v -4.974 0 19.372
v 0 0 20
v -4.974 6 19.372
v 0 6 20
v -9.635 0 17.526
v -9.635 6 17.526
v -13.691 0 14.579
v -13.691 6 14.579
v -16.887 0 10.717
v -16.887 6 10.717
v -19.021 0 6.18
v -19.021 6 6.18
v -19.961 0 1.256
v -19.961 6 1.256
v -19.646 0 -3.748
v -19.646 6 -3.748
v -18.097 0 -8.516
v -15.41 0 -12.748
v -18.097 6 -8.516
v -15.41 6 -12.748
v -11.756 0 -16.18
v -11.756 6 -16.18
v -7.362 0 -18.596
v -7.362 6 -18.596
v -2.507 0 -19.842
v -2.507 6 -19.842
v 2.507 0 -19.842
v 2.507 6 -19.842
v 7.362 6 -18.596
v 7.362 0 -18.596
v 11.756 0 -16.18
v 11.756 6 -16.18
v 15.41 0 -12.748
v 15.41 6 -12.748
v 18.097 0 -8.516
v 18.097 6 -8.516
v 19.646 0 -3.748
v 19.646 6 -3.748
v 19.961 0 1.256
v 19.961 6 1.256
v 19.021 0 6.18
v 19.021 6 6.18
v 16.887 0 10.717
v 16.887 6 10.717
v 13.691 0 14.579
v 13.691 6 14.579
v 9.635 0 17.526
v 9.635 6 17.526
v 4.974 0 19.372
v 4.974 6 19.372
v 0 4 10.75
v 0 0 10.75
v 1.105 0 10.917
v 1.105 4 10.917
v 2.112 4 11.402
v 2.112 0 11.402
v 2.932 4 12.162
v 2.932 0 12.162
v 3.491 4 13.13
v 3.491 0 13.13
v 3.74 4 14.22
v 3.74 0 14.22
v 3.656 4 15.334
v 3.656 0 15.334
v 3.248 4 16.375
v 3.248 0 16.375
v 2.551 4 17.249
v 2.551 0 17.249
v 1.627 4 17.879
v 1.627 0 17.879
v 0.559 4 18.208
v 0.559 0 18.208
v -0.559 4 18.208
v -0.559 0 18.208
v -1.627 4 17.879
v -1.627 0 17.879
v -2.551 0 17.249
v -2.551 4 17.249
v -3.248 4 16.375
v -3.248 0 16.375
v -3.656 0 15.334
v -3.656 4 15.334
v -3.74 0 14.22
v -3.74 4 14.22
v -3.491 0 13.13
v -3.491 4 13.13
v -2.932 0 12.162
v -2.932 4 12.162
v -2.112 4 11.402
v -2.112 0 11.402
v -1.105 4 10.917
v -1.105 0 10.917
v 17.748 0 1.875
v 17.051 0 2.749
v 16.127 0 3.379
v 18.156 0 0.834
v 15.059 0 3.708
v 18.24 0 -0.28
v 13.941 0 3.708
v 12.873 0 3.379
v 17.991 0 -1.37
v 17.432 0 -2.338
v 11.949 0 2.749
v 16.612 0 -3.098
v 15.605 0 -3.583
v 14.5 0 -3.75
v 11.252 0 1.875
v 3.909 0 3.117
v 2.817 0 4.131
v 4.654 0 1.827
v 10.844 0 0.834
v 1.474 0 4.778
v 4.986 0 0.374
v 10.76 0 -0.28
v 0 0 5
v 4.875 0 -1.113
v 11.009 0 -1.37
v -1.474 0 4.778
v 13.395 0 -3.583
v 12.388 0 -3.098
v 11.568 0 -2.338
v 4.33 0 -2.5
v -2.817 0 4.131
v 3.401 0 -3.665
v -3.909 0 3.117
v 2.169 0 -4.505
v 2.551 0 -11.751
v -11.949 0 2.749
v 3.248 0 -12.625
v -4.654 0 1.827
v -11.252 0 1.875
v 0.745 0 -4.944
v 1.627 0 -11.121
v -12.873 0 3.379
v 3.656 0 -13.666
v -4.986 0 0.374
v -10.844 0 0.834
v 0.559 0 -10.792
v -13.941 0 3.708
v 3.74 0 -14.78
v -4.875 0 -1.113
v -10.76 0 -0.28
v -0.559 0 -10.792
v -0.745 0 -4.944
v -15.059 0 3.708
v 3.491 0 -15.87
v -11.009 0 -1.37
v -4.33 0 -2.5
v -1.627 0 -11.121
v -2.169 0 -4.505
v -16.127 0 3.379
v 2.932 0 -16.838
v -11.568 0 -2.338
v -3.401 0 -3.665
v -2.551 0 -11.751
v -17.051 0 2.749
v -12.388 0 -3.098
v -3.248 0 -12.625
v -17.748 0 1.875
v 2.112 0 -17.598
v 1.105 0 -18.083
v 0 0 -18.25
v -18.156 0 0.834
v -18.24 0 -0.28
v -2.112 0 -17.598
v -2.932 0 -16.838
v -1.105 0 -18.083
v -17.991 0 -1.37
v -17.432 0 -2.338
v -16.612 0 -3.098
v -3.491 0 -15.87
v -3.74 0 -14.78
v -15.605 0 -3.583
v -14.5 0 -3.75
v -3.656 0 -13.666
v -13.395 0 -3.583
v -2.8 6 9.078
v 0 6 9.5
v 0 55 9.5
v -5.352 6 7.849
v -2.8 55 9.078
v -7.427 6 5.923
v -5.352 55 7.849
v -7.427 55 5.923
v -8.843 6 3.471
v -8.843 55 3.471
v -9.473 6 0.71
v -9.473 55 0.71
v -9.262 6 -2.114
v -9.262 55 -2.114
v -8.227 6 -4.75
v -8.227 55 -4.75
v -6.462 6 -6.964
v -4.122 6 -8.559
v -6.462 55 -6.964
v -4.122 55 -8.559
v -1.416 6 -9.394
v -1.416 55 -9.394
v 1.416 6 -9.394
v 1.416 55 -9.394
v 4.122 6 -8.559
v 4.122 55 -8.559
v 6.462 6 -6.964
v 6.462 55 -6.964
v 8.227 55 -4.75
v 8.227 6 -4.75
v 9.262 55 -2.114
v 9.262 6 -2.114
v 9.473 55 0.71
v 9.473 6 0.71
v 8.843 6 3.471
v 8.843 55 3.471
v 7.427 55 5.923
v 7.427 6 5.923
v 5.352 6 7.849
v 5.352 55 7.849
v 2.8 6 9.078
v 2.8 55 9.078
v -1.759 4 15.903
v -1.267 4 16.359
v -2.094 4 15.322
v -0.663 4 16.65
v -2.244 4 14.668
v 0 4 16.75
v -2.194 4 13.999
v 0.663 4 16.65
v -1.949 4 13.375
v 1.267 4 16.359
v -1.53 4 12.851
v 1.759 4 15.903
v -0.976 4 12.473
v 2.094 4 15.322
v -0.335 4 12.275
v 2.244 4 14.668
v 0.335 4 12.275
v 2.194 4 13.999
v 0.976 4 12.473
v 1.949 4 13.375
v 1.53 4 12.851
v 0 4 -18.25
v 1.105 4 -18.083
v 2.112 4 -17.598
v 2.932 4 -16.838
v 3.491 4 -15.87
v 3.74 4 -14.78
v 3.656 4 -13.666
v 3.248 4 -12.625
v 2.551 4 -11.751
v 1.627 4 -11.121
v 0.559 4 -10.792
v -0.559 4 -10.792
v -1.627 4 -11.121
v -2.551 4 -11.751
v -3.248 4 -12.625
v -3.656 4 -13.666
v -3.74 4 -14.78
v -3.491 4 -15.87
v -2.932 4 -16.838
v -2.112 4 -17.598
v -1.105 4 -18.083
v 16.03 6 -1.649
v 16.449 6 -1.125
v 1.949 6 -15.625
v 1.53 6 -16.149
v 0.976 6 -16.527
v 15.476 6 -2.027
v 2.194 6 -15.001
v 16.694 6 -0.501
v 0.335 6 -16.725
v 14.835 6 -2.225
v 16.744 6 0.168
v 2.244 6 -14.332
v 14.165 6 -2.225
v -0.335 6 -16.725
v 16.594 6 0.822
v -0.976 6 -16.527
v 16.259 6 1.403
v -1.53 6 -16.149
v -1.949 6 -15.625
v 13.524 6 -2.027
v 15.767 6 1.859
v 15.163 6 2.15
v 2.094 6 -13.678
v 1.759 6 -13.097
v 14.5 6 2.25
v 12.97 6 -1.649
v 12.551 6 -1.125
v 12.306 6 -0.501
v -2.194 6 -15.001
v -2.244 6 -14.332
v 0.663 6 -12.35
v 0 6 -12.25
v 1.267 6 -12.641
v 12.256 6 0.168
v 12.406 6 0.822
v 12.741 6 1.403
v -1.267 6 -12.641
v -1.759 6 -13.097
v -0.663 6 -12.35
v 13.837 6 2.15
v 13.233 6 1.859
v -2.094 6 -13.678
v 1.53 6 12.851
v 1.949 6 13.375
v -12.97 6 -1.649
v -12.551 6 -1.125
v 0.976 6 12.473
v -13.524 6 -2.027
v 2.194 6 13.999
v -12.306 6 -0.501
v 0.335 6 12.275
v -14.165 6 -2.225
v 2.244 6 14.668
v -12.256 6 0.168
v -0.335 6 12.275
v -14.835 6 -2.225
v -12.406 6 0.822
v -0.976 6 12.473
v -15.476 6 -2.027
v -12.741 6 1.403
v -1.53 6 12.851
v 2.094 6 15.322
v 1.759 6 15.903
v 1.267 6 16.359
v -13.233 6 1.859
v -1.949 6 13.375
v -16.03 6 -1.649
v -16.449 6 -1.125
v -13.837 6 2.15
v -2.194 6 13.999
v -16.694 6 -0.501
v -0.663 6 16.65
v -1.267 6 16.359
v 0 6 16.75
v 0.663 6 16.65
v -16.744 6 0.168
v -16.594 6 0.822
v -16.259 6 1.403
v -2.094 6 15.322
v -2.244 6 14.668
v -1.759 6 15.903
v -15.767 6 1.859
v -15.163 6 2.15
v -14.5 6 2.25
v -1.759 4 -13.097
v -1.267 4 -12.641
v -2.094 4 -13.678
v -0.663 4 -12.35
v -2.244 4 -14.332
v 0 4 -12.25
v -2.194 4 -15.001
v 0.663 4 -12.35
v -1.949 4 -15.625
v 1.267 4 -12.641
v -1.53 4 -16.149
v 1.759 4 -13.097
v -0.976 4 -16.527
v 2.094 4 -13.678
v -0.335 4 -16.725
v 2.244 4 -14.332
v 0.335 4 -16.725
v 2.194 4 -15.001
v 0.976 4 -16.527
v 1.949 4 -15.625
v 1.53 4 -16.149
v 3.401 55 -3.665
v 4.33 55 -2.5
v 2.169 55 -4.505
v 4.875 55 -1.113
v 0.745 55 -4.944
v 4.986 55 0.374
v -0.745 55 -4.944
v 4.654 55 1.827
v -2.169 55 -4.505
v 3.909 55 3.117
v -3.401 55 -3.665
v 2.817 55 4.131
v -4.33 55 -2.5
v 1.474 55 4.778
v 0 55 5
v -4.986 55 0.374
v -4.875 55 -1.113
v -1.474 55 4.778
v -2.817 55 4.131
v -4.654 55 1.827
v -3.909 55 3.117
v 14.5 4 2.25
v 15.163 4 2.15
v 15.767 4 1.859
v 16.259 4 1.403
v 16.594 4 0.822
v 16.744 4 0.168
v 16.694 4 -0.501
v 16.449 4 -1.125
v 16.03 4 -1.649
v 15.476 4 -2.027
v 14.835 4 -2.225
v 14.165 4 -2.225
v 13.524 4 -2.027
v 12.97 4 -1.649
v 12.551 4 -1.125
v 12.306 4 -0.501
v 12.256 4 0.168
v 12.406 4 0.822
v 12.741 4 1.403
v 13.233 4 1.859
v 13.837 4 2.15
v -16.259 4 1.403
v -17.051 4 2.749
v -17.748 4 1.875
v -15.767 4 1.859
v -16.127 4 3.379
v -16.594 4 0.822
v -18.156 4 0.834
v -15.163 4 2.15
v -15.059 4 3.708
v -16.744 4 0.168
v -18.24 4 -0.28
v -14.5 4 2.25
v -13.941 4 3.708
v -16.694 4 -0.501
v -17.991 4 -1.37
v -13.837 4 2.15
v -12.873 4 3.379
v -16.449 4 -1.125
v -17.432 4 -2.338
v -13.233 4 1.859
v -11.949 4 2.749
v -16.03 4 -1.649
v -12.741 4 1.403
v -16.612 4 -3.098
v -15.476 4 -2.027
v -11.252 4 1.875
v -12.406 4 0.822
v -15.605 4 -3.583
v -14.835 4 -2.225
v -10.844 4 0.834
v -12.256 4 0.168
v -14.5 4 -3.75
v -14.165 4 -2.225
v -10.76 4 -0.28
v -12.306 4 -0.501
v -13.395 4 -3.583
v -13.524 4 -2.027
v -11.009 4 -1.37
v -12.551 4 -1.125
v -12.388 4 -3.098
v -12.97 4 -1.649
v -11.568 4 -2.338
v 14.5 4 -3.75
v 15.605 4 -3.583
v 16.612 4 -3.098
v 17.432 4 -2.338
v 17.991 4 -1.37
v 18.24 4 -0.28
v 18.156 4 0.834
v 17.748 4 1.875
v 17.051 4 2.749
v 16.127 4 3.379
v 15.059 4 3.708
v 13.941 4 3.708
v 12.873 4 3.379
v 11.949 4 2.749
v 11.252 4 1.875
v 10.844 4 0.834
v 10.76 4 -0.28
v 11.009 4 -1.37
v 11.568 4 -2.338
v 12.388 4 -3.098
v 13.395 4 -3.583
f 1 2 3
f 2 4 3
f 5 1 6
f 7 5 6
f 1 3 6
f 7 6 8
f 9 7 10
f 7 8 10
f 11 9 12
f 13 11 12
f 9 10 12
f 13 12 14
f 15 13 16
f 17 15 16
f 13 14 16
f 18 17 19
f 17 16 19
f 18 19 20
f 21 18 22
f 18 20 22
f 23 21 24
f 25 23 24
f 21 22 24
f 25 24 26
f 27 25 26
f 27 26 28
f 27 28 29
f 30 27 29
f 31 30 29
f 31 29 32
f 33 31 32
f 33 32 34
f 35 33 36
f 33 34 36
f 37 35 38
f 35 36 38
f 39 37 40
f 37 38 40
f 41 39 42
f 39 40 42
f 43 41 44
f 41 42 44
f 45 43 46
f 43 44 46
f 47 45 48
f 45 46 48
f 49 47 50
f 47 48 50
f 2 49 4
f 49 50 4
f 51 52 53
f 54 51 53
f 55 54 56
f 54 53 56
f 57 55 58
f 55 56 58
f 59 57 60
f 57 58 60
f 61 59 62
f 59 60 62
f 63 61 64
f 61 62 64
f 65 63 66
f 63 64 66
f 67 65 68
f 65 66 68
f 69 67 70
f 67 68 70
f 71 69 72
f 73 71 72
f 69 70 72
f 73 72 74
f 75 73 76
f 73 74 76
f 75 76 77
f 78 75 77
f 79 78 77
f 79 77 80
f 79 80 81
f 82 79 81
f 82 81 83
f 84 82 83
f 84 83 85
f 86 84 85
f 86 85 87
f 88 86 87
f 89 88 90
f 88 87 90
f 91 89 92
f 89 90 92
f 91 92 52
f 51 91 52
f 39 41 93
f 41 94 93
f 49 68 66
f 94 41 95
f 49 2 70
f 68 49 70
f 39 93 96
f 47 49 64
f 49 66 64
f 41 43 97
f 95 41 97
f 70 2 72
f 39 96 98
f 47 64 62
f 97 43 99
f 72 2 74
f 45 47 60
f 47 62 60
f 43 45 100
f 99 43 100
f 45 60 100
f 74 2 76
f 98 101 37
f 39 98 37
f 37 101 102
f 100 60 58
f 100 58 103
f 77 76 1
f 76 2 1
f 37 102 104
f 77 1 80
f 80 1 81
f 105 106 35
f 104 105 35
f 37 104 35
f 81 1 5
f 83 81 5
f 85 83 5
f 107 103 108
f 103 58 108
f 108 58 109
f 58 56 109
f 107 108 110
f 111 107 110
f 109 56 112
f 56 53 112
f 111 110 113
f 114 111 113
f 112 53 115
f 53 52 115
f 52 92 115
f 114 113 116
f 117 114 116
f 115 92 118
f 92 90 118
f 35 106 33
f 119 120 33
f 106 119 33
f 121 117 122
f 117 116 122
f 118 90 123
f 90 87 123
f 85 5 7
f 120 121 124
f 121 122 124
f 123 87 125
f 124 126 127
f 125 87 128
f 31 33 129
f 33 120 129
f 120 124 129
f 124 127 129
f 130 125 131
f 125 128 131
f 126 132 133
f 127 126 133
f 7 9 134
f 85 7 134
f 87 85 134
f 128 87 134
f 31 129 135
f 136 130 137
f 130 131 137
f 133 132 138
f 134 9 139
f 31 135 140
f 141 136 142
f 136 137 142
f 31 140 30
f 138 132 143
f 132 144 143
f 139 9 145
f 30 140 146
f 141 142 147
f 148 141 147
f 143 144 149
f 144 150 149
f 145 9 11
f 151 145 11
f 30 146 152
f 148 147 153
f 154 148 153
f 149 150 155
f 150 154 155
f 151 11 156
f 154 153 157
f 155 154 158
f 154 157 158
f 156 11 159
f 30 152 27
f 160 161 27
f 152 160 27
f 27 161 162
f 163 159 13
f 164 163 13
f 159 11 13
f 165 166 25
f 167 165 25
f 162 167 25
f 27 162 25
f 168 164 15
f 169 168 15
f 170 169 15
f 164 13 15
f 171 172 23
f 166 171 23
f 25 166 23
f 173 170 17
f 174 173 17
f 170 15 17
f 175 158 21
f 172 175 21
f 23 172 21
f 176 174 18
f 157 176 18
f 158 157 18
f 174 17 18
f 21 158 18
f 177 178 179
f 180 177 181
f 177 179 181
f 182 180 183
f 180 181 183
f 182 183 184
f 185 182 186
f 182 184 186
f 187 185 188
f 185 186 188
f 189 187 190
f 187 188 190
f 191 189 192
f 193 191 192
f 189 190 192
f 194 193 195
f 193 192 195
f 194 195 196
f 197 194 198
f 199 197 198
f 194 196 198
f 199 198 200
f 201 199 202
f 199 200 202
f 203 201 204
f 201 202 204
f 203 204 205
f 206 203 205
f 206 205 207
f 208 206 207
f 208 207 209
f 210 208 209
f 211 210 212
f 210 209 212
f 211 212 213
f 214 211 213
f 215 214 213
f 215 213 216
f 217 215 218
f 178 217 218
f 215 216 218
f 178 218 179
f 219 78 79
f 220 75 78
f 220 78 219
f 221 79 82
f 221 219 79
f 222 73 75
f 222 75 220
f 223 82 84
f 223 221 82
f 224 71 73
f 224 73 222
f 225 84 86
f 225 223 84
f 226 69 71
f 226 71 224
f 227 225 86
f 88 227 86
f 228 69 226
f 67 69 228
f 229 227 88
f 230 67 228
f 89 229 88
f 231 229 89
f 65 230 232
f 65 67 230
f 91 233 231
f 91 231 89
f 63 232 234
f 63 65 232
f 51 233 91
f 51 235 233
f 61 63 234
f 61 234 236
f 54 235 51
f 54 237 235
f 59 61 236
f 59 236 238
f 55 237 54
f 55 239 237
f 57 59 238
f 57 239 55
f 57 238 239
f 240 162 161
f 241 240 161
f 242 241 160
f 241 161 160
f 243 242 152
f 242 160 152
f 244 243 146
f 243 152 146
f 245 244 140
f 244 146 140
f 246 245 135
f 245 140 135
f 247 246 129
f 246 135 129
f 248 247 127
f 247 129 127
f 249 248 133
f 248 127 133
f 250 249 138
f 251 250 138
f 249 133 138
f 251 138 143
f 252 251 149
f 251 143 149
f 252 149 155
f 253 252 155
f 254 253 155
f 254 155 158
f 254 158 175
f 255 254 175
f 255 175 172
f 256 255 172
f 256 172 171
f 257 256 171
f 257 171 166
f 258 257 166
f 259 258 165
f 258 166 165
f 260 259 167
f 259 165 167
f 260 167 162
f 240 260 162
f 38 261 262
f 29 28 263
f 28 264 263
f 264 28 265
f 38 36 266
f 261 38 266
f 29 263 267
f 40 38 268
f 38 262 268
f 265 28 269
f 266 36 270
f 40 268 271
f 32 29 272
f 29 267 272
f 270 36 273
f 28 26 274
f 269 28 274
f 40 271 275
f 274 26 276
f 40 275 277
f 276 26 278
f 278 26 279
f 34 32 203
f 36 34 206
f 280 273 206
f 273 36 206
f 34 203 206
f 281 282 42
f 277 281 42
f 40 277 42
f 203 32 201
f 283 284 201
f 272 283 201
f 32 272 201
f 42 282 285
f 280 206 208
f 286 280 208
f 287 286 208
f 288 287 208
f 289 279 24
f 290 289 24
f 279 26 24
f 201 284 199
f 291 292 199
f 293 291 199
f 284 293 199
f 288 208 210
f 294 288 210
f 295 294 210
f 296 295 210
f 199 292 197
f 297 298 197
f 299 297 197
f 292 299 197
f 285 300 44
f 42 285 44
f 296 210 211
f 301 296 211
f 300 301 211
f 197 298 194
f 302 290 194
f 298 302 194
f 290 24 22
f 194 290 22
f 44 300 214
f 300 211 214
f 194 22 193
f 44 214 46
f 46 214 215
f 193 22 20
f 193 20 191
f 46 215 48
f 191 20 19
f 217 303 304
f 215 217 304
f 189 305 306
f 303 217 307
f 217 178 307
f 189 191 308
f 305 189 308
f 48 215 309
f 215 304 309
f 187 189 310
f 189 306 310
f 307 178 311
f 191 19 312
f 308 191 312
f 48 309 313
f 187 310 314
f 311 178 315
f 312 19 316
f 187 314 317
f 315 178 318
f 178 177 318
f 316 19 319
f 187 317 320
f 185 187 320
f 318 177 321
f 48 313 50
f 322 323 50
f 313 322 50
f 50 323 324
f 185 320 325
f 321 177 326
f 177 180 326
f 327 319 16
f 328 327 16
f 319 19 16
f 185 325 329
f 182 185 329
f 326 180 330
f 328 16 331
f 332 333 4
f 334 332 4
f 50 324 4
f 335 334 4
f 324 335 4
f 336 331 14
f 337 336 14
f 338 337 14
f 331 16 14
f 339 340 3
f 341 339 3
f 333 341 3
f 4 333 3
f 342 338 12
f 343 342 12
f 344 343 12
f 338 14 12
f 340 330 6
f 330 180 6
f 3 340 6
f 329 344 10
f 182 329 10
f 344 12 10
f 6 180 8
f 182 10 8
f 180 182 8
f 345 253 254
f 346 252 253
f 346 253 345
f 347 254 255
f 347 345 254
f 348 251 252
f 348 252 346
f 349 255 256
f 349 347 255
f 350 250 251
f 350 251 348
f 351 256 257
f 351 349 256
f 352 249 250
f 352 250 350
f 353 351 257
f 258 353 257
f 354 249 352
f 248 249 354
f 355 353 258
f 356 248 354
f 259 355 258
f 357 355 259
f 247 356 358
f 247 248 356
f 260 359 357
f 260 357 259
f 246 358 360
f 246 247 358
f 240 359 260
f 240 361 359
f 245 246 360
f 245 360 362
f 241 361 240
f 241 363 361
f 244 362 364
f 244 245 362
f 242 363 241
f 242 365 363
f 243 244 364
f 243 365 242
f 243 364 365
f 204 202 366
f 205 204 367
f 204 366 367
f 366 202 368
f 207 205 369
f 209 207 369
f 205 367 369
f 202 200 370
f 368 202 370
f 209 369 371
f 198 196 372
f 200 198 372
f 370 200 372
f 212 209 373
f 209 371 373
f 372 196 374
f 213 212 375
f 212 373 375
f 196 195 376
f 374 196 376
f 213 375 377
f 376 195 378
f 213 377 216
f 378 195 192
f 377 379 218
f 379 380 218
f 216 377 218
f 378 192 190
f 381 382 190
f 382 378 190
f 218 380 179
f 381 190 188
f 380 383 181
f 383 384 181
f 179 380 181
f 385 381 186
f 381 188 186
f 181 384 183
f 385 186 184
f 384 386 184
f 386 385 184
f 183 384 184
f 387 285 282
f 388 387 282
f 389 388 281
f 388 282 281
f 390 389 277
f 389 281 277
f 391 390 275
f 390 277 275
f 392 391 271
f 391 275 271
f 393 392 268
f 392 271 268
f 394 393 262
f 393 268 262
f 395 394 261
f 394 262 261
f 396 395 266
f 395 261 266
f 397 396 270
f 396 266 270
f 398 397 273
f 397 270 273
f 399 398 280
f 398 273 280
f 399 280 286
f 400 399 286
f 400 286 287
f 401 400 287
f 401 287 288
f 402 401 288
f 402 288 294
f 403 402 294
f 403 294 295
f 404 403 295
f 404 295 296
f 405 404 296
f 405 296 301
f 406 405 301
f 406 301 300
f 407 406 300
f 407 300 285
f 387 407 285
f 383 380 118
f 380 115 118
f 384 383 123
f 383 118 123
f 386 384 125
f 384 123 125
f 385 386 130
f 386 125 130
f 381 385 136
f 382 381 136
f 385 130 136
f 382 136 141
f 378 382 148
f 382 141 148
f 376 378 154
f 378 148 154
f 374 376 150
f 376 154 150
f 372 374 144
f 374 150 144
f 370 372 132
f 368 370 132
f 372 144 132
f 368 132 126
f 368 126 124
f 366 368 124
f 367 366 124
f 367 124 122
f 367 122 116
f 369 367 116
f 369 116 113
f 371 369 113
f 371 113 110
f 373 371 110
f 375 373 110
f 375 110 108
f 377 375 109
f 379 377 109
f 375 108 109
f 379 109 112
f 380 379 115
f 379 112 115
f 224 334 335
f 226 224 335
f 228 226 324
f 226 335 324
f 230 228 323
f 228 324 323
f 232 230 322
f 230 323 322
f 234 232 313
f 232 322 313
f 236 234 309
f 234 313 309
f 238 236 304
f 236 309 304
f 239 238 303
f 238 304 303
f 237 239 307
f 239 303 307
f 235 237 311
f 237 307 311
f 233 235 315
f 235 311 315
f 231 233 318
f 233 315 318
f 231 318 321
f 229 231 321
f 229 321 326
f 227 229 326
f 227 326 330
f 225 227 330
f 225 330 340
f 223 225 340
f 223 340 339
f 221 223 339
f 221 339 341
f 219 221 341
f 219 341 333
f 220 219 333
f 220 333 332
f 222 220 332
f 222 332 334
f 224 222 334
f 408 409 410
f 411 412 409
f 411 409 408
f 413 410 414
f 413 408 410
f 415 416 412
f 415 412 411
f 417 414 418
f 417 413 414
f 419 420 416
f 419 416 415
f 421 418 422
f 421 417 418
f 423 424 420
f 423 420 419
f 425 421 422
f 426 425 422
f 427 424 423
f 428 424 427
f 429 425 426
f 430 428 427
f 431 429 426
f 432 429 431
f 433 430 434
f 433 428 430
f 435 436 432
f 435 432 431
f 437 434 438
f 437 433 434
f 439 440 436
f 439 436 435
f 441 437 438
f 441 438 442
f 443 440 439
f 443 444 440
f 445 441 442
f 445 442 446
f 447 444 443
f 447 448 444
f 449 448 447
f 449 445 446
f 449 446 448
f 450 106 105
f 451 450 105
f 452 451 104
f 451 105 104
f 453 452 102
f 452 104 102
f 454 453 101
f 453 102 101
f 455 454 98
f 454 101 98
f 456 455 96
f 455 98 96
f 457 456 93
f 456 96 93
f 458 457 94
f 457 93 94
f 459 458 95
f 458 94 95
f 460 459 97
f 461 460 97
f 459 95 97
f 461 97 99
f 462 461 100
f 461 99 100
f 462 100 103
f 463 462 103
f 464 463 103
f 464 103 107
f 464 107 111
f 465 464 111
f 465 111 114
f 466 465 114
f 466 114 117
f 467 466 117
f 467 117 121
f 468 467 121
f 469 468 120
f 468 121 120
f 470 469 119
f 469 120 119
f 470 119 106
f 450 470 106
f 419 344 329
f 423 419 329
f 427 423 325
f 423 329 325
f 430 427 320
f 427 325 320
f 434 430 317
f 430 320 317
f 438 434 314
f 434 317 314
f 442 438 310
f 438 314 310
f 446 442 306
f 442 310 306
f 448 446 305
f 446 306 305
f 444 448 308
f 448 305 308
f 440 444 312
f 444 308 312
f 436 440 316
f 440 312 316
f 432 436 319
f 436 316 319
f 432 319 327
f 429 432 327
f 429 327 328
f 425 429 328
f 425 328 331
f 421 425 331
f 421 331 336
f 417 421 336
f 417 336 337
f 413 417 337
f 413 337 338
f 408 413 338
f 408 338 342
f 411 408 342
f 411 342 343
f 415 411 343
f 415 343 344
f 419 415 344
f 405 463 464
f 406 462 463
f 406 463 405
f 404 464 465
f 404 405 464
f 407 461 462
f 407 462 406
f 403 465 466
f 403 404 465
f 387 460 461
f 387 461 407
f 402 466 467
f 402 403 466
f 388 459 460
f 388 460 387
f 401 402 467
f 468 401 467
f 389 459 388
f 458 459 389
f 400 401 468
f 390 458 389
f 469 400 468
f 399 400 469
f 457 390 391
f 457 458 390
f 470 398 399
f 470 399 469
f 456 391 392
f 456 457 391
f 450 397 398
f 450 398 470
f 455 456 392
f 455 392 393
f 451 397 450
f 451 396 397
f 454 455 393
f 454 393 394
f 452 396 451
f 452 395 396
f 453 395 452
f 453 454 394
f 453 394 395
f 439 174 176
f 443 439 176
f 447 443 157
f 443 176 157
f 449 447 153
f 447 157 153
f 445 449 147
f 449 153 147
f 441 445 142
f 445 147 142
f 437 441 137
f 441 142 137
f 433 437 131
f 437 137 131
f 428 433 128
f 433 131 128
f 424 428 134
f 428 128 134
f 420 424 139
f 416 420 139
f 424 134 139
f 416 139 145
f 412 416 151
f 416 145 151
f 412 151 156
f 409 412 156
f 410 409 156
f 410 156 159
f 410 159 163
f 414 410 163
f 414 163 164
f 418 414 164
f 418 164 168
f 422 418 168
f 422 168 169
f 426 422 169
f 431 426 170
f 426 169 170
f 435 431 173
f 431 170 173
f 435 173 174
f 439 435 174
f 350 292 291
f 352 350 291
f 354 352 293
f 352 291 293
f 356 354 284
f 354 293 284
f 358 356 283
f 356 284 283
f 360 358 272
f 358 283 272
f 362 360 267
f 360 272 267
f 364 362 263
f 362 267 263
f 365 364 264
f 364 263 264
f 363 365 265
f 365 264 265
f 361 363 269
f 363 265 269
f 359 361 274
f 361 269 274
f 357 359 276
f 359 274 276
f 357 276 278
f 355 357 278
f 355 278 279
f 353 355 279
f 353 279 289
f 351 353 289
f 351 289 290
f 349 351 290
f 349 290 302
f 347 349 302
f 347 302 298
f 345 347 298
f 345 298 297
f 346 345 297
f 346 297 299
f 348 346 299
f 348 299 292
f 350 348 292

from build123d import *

# Parameters (mm, degrees)
SKETCH_2_R          = 2.25
CUT_EXTRUDE_1_DEPTH = 57.577380639
SKETCH_3_R          = 3.75
CUT_EXTRUDE_2_DEPTH = 4


with BuildPart() as part:
    # Эскиз1 → Повернуть1 (revolve)
    with BuildSketch(Plane.XY, mode=Mode.PRIVATE) as revolve_1_sk:
        Polygon((5, 55), (5, 0), (20, 0), (20, 6), (9.5, 6), (9.5, 55), align=None)
    revolve(revolve_1_sk.sketch.rotate(Axis((0, 53.580953173, 0), (0, -1, 0)), 90), axis=Axis((0, 53.580953173, 0), (0, -1, 0)))

    # Эскиз2 → Вырез-Вытянуть1 (cut, through all)
    with BuildSketch(Plane(origin=(0, 6, 0), x_dir=(1, 0, 0), z_dir=(0, 1, 0))):
        with Locations(Location((14.5, 0, 0), (0, 0, 270))):
            Circle(SKETCH_2_R)
        with Locations(Location((0, -14.5, 0), (0, 0, 270))):
            Circle(SKETCH_2_R)
        with Locations(Location((-14.5, 0, 0), (0, 0, 270))):
            Circle(SKETCH_2_R)
        with Locations(Location((0, 14.5, 0), (0, 0, 270))):
            Circle(SKETCH_2_R)
    extrude(amount=-CUT_EXTRUDE_1_DEPTH, mode=Mode.SUBTRACT)

    # Эскиз3 → Вырез-Вытянуть2 (cut)
    with BuildSketch(Plane.XZ):
        with Locations(Location((-14.5, 0, 0), (0, 0, 270))):
            Circle(SKETCH_3_R)
        with Locations(Location((0, 14.5, 0), (0, 0, 270))):
            Circle(SKETCH_3_R)
        with Locations(Location((14.5, 0, 0), (0, 0, 270))):
            Circle(SKETCH_3_R)
        with Locations(Location((0, -14.5, 0), (0, 0, 270))):
            Circle(SKETCH_3_R)
    extrude(amount=-CUT_EXTRUDE_2_DEPTH, mode=Mode.SUBTRACT)


solid = part.part
